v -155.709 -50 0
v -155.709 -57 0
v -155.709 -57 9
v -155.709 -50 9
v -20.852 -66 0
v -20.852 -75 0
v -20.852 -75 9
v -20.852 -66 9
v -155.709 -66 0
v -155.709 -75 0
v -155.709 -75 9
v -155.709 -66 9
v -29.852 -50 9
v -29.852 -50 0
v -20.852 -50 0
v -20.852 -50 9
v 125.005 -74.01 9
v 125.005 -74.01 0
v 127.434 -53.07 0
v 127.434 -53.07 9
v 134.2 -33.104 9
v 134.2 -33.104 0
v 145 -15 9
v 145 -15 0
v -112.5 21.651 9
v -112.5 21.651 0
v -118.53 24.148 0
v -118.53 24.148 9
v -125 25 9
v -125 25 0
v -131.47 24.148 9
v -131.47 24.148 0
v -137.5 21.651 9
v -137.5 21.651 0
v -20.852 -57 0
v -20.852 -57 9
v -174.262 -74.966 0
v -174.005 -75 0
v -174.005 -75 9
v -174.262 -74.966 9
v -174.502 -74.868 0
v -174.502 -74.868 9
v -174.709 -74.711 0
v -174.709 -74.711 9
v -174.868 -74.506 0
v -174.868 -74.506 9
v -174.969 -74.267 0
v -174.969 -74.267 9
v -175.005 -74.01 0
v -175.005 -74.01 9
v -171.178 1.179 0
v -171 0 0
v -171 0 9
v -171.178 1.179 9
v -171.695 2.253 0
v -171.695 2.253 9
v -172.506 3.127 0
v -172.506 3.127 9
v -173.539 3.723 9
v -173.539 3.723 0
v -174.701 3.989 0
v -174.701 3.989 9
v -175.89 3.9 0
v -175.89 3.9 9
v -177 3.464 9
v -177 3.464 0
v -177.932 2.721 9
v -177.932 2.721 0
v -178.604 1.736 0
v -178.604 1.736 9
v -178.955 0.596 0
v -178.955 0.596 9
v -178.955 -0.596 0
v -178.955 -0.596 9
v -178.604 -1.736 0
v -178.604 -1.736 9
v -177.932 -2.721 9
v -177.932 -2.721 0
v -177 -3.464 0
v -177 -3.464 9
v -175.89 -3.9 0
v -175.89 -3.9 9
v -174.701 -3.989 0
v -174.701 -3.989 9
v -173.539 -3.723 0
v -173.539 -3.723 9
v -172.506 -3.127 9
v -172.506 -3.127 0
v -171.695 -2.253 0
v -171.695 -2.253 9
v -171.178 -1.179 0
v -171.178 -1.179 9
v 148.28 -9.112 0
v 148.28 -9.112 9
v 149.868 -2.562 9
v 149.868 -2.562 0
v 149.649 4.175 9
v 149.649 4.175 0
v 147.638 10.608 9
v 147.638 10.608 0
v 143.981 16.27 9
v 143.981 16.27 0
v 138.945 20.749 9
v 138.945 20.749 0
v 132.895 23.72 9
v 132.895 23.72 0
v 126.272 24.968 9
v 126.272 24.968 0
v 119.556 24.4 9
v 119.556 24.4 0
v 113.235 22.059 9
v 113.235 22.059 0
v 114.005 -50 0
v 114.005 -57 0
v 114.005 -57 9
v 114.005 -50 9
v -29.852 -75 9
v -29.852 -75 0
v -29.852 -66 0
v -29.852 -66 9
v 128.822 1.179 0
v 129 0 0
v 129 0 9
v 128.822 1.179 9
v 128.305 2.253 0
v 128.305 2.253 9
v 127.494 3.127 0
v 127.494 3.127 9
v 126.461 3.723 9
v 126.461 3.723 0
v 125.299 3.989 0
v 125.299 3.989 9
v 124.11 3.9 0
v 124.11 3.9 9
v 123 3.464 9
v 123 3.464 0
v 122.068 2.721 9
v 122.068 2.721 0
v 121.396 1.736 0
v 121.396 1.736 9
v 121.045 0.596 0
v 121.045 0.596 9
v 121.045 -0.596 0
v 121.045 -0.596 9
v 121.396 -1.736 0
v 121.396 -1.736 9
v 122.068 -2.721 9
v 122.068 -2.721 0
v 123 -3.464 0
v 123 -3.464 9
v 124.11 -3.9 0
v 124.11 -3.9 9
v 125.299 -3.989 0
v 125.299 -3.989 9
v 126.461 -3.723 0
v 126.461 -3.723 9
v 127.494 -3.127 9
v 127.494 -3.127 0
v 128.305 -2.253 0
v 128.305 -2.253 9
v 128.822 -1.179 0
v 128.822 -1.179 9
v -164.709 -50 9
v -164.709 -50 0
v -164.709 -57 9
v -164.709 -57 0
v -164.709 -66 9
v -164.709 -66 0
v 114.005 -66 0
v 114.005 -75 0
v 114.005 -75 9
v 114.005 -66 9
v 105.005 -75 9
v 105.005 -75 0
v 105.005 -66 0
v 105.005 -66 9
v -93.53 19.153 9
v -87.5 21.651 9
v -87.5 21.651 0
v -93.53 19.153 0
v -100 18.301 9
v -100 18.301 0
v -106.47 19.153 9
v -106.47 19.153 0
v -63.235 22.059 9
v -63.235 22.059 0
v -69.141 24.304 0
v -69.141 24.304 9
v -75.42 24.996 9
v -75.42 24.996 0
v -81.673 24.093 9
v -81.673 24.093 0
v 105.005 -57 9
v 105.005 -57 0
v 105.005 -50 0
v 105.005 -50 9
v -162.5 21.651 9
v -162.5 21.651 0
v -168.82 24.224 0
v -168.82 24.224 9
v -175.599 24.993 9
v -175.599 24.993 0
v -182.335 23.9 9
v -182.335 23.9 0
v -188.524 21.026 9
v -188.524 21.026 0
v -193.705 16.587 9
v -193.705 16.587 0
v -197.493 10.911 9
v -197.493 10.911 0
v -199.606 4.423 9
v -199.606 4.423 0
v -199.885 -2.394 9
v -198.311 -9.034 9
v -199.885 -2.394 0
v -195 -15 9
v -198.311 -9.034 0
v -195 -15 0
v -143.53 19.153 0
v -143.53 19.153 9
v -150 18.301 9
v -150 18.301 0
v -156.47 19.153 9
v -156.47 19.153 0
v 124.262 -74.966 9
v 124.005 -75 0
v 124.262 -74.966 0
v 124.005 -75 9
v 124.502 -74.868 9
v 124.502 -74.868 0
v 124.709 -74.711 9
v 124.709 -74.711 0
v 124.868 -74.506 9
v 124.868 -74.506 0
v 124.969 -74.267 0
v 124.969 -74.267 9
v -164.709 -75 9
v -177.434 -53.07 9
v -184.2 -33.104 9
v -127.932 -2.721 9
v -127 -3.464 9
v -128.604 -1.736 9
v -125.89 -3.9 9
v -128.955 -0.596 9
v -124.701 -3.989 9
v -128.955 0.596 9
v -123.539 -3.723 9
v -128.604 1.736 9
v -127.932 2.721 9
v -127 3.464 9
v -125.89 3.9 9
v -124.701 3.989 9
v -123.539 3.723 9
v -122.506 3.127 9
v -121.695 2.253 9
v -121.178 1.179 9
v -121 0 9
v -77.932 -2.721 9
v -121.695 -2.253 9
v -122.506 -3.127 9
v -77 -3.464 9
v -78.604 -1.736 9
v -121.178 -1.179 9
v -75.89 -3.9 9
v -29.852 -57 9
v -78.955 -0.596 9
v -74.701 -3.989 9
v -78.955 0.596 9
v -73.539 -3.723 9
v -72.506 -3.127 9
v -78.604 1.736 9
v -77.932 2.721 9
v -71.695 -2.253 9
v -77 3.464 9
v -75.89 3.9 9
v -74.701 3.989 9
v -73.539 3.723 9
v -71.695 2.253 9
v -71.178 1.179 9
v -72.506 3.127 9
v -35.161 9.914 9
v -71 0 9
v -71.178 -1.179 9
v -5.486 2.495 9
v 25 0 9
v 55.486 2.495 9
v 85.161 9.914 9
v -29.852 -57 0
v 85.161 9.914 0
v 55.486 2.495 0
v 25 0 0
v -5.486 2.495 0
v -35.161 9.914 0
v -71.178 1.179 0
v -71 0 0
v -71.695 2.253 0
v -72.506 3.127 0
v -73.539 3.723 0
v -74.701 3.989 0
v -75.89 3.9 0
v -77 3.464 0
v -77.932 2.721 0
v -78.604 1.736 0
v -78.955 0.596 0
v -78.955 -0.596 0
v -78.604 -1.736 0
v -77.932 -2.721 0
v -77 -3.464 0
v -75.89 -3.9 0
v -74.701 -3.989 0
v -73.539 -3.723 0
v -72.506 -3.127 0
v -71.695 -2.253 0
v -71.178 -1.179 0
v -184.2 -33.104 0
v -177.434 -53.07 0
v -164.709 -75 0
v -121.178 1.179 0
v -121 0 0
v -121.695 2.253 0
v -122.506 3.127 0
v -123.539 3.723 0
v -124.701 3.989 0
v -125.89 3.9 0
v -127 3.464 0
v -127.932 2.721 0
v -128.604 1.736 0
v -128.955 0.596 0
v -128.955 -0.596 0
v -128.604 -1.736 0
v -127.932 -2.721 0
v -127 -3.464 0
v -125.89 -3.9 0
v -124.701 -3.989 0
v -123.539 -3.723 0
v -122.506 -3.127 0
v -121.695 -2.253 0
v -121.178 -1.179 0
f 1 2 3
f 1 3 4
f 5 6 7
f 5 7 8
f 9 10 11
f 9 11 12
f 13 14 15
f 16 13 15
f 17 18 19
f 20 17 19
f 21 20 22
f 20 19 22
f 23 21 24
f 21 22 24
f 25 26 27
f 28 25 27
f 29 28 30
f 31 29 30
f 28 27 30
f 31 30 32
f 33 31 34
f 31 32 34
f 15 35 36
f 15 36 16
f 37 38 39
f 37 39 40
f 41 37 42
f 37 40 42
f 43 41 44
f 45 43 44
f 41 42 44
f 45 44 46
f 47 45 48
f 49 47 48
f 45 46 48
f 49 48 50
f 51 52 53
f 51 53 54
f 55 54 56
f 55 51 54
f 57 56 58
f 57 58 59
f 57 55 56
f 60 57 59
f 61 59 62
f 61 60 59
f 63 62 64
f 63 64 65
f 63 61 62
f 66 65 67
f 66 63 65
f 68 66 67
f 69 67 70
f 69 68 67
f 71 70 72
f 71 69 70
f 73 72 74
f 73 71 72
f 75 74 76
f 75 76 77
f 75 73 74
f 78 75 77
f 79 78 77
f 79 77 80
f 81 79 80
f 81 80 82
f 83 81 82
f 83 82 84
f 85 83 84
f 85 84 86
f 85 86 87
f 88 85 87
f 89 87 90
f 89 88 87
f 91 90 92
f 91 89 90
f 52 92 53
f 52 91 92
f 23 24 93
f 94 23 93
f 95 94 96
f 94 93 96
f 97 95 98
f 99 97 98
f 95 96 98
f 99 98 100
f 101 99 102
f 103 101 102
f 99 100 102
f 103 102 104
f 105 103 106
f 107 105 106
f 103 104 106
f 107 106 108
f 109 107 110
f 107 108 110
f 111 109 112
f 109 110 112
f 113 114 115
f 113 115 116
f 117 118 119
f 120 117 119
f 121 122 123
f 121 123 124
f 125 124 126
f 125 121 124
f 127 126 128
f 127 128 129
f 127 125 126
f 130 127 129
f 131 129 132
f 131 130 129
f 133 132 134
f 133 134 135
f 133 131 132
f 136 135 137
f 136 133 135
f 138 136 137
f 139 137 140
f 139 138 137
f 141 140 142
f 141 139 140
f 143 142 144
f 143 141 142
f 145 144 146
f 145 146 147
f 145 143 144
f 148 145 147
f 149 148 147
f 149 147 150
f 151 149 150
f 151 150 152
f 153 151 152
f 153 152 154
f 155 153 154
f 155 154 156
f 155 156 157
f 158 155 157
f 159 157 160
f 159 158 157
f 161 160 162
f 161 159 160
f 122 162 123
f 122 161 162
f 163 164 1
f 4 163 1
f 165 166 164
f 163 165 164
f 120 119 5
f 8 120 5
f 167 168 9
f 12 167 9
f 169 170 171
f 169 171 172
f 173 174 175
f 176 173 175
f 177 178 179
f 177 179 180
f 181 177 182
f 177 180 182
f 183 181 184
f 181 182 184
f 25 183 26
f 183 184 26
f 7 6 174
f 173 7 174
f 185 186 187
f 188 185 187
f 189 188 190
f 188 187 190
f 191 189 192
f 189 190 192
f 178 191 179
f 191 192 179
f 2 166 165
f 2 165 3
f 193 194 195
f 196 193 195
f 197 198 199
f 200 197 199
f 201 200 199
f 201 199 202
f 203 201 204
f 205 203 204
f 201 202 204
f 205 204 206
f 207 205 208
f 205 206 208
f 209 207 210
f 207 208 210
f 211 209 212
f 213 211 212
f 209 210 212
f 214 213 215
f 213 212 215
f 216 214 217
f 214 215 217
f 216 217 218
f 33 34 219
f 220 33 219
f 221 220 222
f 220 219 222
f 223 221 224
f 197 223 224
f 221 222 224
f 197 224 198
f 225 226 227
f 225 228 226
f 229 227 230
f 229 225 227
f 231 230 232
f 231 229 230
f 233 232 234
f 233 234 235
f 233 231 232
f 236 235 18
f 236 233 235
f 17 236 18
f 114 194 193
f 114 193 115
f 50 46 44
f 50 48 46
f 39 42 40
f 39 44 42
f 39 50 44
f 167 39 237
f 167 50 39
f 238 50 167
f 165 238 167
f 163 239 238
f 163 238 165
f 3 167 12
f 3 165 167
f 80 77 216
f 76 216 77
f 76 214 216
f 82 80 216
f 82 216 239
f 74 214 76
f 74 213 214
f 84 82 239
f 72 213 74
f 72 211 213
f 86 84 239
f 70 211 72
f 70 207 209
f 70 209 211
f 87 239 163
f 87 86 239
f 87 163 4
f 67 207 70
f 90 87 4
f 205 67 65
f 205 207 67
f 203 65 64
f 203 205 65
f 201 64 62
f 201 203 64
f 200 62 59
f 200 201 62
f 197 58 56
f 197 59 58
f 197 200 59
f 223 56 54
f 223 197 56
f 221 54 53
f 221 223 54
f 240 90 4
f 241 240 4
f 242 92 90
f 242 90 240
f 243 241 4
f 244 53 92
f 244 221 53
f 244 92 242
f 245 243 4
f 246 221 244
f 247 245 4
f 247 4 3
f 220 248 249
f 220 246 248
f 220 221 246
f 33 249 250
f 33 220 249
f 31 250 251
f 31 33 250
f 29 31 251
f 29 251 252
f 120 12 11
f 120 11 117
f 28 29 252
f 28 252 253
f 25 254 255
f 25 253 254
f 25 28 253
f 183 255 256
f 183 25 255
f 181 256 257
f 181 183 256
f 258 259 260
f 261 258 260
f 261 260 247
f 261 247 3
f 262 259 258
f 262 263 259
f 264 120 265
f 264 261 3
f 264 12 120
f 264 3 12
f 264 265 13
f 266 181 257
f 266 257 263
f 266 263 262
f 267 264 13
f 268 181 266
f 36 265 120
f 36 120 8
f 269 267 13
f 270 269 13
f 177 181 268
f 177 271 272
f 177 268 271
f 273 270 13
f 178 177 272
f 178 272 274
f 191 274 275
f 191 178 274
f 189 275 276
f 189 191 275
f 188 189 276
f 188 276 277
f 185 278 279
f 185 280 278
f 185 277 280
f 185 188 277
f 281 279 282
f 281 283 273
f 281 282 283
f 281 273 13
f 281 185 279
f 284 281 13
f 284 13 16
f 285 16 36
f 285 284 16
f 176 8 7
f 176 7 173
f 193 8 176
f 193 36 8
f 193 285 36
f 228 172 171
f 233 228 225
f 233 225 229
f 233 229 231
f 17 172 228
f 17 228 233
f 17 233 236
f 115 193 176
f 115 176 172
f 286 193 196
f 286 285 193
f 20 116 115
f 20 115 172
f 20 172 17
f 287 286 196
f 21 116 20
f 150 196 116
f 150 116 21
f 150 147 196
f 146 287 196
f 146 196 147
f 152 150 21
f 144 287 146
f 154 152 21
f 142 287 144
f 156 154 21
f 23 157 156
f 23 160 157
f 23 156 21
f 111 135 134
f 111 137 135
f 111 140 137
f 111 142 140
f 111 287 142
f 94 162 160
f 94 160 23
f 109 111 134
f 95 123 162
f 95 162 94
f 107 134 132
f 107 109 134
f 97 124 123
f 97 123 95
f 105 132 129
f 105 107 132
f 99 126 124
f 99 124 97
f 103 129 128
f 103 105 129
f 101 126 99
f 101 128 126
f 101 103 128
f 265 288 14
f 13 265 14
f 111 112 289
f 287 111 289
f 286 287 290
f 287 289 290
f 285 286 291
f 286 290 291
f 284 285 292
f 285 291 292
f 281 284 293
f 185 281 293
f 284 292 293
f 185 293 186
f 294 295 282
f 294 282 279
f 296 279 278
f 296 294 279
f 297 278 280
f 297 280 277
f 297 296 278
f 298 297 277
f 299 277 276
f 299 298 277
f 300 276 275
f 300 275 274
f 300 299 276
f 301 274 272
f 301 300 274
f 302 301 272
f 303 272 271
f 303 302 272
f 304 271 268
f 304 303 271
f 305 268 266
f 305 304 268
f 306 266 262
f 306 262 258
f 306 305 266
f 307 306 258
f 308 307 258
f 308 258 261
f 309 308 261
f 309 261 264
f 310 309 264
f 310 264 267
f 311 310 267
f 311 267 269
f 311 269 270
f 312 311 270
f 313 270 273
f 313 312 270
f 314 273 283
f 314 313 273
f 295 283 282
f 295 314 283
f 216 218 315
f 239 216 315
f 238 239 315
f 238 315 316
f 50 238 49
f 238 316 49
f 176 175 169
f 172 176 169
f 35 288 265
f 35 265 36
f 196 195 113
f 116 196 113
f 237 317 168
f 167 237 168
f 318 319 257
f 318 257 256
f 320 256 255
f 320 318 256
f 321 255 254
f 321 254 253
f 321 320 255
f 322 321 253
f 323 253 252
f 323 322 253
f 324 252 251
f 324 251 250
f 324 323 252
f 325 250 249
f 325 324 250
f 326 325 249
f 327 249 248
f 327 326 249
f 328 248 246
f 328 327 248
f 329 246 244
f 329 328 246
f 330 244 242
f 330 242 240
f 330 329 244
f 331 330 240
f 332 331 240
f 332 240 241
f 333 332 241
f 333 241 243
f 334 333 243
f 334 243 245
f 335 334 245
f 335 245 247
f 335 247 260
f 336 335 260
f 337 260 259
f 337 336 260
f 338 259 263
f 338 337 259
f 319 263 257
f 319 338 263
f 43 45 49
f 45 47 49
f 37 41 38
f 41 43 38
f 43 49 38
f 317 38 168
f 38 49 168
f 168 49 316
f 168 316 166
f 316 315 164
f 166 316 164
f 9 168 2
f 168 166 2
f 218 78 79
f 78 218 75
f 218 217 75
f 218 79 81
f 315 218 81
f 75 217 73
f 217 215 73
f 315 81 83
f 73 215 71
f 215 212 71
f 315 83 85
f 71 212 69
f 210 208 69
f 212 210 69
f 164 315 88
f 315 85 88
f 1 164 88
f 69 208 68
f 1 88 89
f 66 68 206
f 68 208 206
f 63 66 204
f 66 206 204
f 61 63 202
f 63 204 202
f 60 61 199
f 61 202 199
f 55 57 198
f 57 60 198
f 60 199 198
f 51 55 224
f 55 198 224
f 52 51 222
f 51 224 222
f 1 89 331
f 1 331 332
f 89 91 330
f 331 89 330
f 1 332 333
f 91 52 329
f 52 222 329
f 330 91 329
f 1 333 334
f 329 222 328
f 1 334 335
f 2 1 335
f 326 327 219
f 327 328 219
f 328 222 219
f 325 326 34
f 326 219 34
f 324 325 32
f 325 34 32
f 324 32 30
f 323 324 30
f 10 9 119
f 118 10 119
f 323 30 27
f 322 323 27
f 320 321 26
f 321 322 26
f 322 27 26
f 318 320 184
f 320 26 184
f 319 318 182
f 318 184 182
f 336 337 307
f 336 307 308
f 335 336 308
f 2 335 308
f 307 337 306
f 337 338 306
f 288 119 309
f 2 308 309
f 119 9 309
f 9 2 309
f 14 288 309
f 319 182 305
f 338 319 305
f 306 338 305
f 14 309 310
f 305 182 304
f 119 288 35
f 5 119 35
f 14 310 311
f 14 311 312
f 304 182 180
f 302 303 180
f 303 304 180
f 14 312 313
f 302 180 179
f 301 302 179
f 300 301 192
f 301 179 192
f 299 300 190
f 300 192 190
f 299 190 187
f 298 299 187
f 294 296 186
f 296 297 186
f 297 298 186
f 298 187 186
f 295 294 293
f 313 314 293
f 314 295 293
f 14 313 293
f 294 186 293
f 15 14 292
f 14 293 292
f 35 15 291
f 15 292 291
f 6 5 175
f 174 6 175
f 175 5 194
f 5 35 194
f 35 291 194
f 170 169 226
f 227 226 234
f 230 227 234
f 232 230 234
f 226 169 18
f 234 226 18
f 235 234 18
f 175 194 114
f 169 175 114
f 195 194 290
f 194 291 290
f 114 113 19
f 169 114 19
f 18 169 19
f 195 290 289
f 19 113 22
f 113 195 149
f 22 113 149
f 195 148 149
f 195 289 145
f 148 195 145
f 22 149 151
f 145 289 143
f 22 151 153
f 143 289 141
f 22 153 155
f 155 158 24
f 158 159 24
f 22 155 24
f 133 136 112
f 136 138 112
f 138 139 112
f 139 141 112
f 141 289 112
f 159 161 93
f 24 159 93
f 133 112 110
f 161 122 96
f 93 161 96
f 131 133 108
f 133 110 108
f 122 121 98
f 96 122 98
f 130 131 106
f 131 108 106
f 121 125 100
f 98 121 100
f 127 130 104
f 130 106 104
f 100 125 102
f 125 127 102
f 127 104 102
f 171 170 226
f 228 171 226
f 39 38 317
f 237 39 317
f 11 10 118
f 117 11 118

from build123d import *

# Parameters (mm, degrees)
SKETCH1_R             = 8
SKETCH1_R_2           = 4
BOSS_EXTRUDE1_DEPTH   = 9
BOSS_EXTRUDE1_2_DEPTH = 9
SKETCH2_R             = 4
BOSS_EXTRUDE3_DEPTH   = 9
FILLET1_R             = 1
SKETCH3_W             = 9
SKETCH3_H             = 9
SKETCH3_H_2           = 7
CUT_EXTRUDE1_DEPTH    = 214.789616212


with BuildPart() as part:
    # Sketch1 → Boss-Extrude1 (new body)
    with BuildSketch(Plane.XY):
        with Locations((-125, 0)):
            Circle(SKETCH1_R)
        with Locations((-125, 0)):
            Circle(SKETCH1_R_2, mode=Mode.SUBTRACT)
    extrude(amount=BOSS_EXTRUDE1_DEPTH)



with BuildPart() as body_2:
    # Sketch1 → Boss-Extrude1 2 (new body)
    with BuildSketch(Plane.XY):
        with Locations((125, 0)):
            Circle(SKETCH1_R)
        with Locations((125, 0)):
            Circle(SKETCH1_R_2, mode=Mode.SUBTRACT)
    extrude(amount=BOSS_EXTRUDE1_2_DEPTH)


with BuildPart() as part_1:
    add(part.part)

    add(body_2.part)  # Boss-Extrude3 merges body 2
    # Sketch2 → Boss-Extrude3 (add)
    with BuildSketch(Plane.XY):
        with BuildLine():
            Line((-175, -75), (125, -75))
            ThreePointArc((125, -75), (130.131670325, -43.377223009), (145.000000492, -14.999999344))
            ThreePointArc((145.000000492, -14.999999344), (143.981414944, 16.269784471), (113.235294528, 22.058823748))
            ThreePointArc((113.235294528, 22.058823748), (25.000000075, 0), (-63.235294395, 22.058823677))
            ThreePointArc((-63.235294395, 22.058823677), (-75.420498385, 24.996463372), (-87.499999896, 21.650635154))
            ThreePointArc((-87.499999896, 21.650635154), (-99.999999954, 18.301270189), (-112.500000024, 21.650635108))
            ThreePointArc((-112.500000024, 21.650635108), (-124.99999995, 25), (-137.49999989, 21.650635158))
            ThreePointArc((-137.49999989, 21.650635158), (-149.999999954, 18.301270189), (-162.50000003, 21.650635112))
            ThreePointArc((-162.50000003, 21.650635112), (-193.705072901, 16.586749162), (-195.000000551, -14.999999265))
            ThreePointArc((-195.000000551, -14.999999265), (-180.13167034, -43.377222962), (-175, -75))
        make_face()
        with Locations((125, 0)):
            Circle(SKETCH2_R, mode=Mode.SUBTRACT)
        with Locations((-175, 0)):
            Circle(SKETCH2_R, mode=Mode.SUBTRACT)
        with Locations((-125, 0)):
            Circle(SKETCH2_R, mode=Mode.SUBTRACT)
        with Locations((-75, 0)):
            Circle(SKETCH2_R, mode=Mode.SUBTRACT)
    extrude(amount=BOSS_EXTRUDE3_DEPTH)

    # Fillet1
    fillet1_edges = [part_1.edges().sort_by_distance(p)[0] for p in [
        (-175, -75, 4.5),
        (125, -75, 4.5),
    ]]
    fillet(fillet1_edges, radius=FILLET1_R)

    # Sketch3 → Cut-Extrude1 (cut, through all)
    with BuildSketch(Plane.XY):
        with Locations((-160.208548161, -70.5)):
            Rectangle(SKETCH3_W, SKETCH3_H)
        with Locations((-25.351798772, -70.5)):
            Rectangle(SKETCH3_W, SKETCH3_H)
        with Locations((109.504950616, -70.5)):
            Rectangle(SKETCH3_W, SKETCH3_H)
        with Locations((-160.208548161, -53.5)):
            Rectangle(SKETCH3_W, SKETCH3_H_2)
        with Locations((-25.351798772, -53.5)):
            Rectangle(SKETCH3_W, SKETCH3_H_2)
        with Locations((109.504950616, -53.5)):
            Rectangle(SKETCH3_W, SKETCH3_H_2)
    extrude(amount=CUT_EXTRUDE1_DEPTH, mode=Mode.SUBTRACT)


solid = part_1.part
